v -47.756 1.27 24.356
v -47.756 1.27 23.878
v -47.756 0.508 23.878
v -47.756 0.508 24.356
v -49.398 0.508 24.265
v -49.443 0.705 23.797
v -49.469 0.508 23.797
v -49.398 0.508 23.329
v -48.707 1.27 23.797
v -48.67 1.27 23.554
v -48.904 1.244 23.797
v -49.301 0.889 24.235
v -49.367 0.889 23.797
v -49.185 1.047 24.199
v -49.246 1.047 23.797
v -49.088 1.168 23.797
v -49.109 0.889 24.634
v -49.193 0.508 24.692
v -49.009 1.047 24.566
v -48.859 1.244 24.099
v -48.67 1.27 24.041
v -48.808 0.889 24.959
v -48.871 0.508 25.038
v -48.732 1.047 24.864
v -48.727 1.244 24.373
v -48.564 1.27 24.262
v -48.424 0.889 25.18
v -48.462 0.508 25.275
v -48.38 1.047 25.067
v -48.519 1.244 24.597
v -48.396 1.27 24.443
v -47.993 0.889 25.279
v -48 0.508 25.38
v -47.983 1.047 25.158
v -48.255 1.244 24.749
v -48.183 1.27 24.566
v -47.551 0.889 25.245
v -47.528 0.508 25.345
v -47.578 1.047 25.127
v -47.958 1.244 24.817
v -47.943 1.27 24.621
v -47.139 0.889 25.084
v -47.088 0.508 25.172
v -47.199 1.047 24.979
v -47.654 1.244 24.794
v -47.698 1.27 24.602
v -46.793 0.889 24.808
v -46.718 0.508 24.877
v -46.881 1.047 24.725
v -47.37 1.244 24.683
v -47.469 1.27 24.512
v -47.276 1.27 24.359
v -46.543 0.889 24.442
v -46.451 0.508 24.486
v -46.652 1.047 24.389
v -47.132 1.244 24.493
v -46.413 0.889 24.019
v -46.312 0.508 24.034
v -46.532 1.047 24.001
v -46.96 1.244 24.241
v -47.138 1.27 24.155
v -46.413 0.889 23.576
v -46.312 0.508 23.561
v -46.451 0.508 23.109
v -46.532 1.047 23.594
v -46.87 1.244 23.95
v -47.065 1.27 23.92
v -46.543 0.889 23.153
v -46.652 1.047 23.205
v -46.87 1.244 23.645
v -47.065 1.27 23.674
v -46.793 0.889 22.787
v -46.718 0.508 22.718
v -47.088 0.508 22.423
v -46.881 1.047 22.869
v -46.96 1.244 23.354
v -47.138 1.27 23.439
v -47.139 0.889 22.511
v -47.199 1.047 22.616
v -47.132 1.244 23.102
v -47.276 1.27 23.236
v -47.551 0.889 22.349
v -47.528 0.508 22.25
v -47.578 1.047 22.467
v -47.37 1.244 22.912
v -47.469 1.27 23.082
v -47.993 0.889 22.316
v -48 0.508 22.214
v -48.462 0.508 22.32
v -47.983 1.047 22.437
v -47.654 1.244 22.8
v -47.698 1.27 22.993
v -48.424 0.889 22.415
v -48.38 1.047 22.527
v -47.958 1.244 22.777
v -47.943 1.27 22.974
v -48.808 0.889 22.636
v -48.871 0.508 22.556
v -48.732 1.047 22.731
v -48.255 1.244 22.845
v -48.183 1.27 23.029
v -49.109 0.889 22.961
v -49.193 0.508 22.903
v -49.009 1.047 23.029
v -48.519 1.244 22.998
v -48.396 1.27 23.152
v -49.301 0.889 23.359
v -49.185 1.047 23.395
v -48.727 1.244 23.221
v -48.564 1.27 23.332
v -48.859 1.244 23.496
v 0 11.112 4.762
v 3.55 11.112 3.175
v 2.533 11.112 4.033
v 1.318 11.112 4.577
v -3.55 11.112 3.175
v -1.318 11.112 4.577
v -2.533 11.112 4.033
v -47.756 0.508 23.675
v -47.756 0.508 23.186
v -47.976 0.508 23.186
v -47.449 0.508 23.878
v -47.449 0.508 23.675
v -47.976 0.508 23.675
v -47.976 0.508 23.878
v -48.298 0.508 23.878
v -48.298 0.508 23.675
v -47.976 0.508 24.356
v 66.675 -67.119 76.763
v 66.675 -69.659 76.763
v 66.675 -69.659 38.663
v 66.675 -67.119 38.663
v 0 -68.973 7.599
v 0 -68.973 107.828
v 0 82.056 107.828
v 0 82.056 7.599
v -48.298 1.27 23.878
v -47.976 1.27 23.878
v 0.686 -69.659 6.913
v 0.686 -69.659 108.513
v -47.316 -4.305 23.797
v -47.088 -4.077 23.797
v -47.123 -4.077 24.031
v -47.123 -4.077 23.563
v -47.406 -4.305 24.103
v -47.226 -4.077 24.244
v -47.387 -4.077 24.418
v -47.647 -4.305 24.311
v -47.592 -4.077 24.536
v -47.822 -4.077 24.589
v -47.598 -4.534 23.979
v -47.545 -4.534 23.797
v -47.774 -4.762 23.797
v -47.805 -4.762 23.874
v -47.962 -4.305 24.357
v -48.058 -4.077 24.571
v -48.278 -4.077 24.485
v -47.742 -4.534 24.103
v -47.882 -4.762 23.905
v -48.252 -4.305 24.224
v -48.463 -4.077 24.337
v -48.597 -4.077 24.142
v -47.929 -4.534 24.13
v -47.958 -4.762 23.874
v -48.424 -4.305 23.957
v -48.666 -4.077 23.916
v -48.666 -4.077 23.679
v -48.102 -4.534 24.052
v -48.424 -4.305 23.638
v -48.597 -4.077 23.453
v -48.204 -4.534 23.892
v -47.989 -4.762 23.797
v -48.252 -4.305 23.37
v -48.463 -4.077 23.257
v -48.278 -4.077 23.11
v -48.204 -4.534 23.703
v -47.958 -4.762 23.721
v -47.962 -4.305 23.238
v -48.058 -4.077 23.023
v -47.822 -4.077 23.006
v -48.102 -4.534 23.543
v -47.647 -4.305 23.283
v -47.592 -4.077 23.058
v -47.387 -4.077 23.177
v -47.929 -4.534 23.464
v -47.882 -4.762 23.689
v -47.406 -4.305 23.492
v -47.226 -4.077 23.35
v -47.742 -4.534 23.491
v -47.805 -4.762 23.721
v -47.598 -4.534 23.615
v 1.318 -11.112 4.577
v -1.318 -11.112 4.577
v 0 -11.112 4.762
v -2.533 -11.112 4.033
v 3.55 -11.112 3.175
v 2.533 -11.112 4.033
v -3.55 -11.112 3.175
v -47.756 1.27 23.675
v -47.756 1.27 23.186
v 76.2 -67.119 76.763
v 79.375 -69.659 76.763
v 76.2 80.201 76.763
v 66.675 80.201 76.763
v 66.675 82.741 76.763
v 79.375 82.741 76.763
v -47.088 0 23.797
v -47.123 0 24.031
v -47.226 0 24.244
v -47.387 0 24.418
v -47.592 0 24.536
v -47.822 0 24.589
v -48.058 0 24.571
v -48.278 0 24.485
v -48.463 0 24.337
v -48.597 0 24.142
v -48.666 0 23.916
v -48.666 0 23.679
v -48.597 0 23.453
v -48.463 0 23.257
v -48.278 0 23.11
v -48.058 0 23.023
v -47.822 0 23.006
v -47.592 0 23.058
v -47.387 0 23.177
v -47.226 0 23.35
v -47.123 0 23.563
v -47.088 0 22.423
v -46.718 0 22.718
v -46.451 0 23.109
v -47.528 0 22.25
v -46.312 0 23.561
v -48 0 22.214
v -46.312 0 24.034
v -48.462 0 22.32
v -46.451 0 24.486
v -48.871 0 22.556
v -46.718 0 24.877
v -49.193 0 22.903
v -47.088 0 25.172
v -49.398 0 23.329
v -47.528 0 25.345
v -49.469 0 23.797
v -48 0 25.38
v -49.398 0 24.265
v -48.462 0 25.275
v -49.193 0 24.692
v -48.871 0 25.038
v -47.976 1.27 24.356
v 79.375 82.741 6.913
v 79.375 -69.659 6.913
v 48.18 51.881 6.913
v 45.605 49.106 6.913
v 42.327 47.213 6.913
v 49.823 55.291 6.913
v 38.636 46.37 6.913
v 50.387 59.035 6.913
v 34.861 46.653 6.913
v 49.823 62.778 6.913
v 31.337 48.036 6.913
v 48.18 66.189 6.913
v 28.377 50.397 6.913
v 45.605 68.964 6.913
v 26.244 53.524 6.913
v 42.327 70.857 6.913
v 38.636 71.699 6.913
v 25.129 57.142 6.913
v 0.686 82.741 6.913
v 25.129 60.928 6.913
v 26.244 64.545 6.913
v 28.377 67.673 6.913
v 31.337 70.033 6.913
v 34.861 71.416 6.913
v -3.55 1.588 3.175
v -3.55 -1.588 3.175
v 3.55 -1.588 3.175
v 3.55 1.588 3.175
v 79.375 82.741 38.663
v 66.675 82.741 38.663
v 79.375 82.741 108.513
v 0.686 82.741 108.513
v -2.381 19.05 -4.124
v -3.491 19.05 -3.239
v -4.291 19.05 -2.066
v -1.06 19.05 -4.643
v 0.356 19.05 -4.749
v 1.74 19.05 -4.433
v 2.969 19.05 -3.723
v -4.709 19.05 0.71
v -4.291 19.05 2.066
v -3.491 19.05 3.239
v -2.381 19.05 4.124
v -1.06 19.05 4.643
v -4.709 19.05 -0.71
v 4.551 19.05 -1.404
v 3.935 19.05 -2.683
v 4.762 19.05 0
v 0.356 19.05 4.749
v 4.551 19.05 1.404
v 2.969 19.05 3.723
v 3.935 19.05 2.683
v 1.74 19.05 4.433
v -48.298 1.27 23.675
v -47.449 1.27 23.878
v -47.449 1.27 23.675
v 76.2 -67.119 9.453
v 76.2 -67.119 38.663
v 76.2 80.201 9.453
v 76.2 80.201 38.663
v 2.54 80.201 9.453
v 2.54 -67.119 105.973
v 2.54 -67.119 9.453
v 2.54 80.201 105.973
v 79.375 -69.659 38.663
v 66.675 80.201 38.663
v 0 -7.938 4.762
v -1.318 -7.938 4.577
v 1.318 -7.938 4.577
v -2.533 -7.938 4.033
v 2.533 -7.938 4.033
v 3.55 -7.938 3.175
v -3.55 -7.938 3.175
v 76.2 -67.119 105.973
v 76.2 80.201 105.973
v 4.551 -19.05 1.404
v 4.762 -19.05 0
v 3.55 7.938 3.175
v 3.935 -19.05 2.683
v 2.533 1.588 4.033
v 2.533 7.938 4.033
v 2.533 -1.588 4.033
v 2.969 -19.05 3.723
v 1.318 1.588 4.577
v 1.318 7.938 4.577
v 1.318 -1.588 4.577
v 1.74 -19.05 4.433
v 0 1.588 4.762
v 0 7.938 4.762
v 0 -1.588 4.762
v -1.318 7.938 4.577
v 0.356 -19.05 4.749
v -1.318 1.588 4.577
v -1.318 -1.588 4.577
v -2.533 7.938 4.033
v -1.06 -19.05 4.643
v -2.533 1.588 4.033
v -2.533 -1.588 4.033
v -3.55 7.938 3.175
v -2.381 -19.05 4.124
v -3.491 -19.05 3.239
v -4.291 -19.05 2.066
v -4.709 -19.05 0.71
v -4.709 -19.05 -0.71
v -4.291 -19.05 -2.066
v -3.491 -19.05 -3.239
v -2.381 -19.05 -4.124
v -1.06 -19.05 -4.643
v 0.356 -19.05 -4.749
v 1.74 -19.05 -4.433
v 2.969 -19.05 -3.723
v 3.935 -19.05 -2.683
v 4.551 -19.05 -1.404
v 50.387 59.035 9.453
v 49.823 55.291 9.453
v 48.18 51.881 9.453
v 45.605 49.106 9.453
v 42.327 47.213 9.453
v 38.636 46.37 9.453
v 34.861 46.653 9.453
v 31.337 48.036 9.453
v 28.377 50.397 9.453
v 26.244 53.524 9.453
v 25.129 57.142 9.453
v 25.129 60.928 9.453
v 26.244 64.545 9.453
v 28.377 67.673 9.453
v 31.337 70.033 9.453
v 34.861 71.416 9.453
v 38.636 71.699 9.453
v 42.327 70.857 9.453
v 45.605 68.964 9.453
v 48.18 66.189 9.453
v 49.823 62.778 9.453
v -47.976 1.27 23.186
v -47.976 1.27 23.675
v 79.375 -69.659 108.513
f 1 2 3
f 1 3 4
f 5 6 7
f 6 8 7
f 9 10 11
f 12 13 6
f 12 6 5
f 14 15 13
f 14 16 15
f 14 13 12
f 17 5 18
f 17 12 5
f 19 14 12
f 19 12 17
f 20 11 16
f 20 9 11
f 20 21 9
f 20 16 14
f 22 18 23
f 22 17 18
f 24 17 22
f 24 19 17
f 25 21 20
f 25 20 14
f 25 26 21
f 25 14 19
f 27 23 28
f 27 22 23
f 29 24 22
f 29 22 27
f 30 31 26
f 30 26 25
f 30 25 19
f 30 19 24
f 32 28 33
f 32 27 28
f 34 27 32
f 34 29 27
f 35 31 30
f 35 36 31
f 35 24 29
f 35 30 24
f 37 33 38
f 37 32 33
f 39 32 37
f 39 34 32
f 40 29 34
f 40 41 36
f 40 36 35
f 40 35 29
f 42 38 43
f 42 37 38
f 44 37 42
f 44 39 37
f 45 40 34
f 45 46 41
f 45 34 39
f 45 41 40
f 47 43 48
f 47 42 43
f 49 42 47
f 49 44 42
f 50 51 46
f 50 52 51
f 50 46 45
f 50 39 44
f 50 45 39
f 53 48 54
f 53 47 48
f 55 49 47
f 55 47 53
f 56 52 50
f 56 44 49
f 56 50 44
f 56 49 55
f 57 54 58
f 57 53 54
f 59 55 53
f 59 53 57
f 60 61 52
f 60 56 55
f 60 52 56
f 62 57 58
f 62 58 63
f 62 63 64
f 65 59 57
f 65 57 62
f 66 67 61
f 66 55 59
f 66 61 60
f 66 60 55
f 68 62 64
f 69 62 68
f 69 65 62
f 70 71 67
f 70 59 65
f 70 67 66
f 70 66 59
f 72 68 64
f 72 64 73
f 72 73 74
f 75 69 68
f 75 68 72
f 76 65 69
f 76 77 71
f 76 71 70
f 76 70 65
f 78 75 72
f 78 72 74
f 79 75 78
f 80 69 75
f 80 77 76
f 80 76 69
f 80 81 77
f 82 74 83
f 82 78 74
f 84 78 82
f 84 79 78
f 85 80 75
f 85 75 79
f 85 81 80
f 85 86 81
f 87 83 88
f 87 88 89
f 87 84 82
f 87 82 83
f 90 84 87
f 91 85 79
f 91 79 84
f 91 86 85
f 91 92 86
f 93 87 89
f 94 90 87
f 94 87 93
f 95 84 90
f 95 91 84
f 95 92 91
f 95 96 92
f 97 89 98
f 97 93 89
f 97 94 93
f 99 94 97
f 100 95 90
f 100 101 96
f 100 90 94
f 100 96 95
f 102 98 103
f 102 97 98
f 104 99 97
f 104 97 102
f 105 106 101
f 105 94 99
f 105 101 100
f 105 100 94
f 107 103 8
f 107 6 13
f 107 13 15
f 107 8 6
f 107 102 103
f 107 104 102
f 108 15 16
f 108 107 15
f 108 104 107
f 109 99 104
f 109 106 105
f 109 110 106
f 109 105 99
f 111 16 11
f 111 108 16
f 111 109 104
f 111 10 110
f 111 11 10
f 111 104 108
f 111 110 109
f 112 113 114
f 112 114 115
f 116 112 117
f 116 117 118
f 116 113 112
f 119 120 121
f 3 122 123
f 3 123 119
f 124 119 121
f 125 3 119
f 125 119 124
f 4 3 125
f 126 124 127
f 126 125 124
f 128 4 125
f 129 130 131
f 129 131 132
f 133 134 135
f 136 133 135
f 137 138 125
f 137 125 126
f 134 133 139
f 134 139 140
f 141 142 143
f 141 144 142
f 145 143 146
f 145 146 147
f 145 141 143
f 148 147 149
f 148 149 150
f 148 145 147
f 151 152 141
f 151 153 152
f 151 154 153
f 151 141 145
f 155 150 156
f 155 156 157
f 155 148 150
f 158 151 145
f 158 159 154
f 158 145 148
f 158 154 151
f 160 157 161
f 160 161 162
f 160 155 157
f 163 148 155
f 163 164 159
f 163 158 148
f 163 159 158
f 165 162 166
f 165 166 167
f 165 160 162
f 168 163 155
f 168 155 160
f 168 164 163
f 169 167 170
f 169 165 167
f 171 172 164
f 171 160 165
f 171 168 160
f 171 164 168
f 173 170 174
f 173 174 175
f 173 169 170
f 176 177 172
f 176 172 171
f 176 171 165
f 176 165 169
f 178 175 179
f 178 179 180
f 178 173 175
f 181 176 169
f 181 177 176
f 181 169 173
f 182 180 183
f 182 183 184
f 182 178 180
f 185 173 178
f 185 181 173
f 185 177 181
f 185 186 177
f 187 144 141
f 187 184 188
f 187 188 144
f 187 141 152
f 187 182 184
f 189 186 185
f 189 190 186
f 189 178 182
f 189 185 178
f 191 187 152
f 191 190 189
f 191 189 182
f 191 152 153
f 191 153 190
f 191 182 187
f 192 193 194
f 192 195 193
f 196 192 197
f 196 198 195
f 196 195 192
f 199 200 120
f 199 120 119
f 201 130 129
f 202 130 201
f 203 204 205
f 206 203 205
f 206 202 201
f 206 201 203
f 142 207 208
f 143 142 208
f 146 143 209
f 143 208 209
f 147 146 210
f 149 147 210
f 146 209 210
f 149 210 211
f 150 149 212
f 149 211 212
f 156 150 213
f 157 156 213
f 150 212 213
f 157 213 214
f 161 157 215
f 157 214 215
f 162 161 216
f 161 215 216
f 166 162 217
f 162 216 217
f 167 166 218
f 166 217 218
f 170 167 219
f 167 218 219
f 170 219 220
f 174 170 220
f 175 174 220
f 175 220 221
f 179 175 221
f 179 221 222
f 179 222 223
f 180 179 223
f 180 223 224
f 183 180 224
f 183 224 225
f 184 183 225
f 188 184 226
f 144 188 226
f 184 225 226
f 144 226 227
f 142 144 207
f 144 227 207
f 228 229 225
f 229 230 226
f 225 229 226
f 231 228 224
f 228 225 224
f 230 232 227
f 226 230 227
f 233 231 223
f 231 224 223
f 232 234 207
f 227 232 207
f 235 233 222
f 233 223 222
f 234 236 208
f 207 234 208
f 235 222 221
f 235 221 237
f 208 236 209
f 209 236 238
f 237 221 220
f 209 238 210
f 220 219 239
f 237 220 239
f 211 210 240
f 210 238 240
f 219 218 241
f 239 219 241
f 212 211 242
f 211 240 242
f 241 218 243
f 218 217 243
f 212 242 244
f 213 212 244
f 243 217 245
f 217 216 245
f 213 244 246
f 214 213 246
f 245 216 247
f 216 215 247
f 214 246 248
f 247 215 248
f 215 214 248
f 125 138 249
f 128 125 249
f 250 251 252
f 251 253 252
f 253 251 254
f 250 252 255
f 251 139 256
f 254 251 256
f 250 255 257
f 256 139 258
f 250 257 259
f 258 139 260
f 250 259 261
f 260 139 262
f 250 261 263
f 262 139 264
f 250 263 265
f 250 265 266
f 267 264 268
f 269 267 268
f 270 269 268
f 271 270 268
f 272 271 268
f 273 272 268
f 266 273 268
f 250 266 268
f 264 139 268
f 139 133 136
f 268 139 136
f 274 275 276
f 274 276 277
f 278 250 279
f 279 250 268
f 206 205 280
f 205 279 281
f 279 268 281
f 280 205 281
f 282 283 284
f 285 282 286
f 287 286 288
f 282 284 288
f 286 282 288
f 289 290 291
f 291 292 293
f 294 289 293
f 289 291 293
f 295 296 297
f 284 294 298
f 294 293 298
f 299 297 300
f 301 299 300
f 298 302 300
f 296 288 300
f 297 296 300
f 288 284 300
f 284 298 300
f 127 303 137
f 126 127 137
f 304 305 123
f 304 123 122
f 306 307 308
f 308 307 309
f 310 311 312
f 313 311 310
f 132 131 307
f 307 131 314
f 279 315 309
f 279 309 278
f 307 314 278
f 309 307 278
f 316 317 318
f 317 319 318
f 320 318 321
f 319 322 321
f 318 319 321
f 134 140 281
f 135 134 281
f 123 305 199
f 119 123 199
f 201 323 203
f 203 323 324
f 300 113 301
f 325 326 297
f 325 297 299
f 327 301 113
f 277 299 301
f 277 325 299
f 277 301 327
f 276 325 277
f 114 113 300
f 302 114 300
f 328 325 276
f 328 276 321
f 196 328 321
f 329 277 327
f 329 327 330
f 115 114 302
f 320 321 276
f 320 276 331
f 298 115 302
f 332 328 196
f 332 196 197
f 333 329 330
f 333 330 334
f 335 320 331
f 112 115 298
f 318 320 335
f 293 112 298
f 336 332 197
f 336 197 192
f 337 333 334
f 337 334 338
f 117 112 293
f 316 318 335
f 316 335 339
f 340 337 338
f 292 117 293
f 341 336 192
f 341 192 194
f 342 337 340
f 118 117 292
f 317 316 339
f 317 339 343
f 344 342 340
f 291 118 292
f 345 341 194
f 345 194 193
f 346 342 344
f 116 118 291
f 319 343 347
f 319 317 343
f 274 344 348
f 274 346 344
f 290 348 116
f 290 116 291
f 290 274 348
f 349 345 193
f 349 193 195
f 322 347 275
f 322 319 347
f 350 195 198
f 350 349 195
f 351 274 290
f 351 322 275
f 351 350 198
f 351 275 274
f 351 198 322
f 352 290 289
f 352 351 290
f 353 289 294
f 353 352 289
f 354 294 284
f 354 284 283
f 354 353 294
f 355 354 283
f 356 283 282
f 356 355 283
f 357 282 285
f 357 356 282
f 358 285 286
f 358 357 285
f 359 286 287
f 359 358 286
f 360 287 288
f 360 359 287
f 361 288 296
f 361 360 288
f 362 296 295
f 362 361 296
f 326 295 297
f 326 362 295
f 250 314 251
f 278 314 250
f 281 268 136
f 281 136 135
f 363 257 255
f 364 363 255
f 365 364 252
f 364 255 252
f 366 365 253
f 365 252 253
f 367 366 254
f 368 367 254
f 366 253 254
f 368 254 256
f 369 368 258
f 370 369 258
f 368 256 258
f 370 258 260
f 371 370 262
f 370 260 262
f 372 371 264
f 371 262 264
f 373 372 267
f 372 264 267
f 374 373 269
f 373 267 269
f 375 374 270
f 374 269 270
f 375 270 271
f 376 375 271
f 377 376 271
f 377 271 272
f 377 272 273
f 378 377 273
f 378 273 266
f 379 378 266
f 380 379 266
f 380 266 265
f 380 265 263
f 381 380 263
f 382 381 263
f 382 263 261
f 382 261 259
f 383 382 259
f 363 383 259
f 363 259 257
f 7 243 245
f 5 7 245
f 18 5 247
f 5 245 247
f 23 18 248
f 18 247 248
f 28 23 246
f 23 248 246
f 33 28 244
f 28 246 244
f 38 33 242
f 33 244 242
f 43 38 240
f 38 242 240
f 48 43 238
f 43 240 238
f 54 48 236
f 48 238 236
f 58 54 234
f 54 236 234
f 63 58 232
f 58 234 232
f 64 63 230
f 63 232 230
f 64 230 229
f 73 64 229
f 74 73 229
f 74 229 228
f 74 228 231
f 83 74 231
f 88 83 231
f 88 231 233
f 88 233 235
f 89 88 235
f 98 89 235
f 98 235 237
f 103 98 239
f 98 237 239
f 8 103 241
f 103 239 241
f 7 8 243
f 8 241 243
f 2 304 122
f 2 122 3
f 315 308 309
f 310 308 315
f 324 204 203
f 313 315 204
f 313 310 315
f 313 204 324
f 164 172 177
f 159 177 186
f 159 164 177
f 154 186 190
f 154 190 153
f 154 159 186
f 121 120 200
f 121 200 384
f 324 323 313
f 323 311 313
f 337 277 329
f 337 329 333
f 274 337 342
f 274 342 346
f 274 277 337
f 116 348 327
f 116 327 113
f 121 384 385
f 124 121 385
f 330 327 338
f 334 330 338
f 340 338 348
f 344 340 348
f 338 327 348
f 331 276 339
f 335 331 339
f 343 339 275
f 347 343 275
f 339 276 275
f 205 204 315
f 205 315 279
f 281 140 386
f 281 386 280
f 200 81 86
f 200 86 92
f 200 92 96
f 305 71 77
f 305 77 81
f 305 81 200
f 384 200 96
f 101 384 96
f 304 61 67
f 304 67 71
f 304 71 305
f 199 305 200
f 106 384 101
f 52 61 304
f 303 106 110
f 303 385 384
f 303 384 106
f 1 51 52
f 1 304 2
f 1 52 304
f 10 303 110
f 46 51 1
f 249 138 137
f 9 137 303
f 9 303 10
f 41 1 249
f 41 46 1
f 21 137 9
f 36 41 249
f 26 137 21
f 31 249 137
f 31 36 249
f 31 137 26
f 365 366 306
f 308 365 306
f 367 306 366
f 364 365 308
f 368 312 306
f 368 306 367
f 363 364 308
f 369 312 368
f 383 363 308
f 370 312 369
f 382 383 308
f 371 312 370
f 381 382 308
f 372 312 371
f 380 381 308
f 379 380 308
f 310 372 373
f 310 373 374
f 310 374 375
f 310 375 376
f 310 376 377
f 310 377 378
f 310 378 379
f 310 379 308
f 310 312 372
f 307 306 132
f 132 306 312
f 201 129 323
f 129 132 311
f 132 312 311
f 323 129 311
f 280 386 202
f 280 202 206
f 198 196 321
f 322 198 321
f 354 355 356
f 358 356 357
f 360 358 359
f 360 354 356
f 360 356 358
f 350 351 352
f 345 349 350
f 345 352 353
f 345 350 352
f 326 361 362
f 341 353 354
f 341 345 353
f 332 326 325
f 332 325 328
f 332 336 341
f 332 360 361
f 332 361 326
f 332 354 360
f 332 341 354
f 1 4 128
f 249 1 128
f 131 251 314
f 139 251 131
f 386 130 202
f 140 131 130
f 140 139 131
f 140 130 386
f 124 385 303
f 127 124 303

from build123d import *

# Parameters (mm, degrees)
F0_R       = 4.7625
F1_DEPTH   = 19.05
F2_W       = 3.175
F2_H       = 3.3072910916
F3_DEPTH   = 12.7
F4_W       = 152.4
F4_H       = 101.6
F5_DEPTH   = 76.2
F6_T       = -2.54
F7_W       = 152.4
F7_H       = 101.6
F8_DEPTH   = 3.175
F9_W       = 177.8
F9_H       = 38.1
F10_DEPTH  = 12.7
F11_R      = 12.7
F12_DEPTH  = 25.4
F13_R      = 0.79375
F14_DEPTH  = 4.7625
F15_SIZE   = 0.6858
F15_2_SIZE = 0.6858
F16_R      = 1.5875
F17_DEPTH  = 1.27
F18_R      = 0.762
F19_W      = 0.2193674445
F19_H      = 1.16994977
F20_DEPTH  = 0.762
F21_W      = 0.8484892041
F21_H      = 0.2032797784
F22_DEPTH  = 0.762


with BuildPart() as f1:
    # F0 (on Front) → F1 (new body, symmetric)
    with BuildSketch(Plane.XZ):
        Circle(F0_R)
    extrude(amount=F1_DEPTH, both=True)

    # F2 (on Right) → F3 (cut, symmetric)
    with BuildSketch(Plane.YZ):
        with Locations((0, 4.8286455458)):
            Rectangle(F2_W, F2_H)
        with Locations((9.525, 4.8286455458)):
            Rectangle(F2_W, F2_H)
        with Locations((-9.525, 4.8286455458)):
            Rectangle(F2_W, F2_H)
    extrude(amount=F3_DEPTH, both=True, mode=Mode.SUBTRACT)


with BuildPart() as f5:
    # F4 (on Right) → F5 (new body)
    with BuildSketch(Plane.YZ):
        with Locations((6.5414318815, 57.7133724002)):
            Rectangle(F4_W, F4_H)
    extrude(amount=F5_DEPTH)

    # F6
    f6_openings = [f5.faces().sort_by_distance(p)[0] for p in [
        (76.2, 6.541432, 57.713372),
    ]]
    offset(amount=F6_T, openings=f6_openings)

    # F7 (on face) → F8 (join)
    with BuildSketch(Plane.YZ.offset(76.2)):
        with Locations((6.5414318815, 57.7133724002)):
            Rectangle(F7_W, F7_H)
    extrude(amount=F8_DEPTH)

    # F9 (on face) → F10 (cut)
    with BuildSketch(Plane.YZ.offset(79.375)):
        with Locations((6.8365962322, 57.7133724002)):
            Rectangle(F9_W, F9_H)
    extrude(amount=-F10_DEPTH, mode=Mode.SUBTRACT)

    # F11 (on face) → F12 (cut)
    with BuildSketch(Plane(origin=(0, 0, 6.9133724002), x_dir=(1, 0, 0), z_dir=(0, 0, -1))):
        with Locations((37.6867502928, -59.0348131955)):
            Circle(F11_R)
    extrude(amount=-F12_DEPTH, mode=Mode.SUBTRACT)

    # F15#2
    f15_2_edges = [f5.edges().sort_by_distance(p)[0] for p in [
        (0, 82.741432, 57.713372),
        (0, 6.541432, 108.513372),
        (0, -69.658568, 57.713372),
        (0, 6.541432, 6.913372),
    ]]
    chamfer(f15_2_edges, length=F15_2_SIZE)


with BuildPart() as f14:
    # F13 (on Front) → F14 (new body)
    with BuildSketch(Plane.XZ):
        with Locations((-47.8815212846, 23.7973220646)):
            Circle(F13_R)
    extrude(amount=F14_DEPTH)

    # F15
    f15_edges = [f14.edges().sort_by_distance(p)[0] for p in [
        (-48.675271, -4.7625, 23.797322),
    ]]
    chamfer(f15_edges, length=F15_SIZE)

    # F16 (on face) → F17 (join)
    with BuildSketch(Plane(origin=(0, 0, 0), x_dir=(-1, 0, 0), z_dir=(0, 1, 0))):
        with Locations((47.8815212846, 23.7973220646)):
            Circle(F16_R)
    extrude(amount=F17_DEPTH)

    # F18
    f18_edges = [f14.edges().sort_by_distance(p)[0] for p in [
        (-46.294021, 1.27, 23.797322),
    ]]
    fillet(f18_edges, radius=F18_R)

    # F19 (on face) → F20 (cut)
    with BuildSketch(Plane(origin=(0, 1.27, 0), x_dir=(-1, 0, 0), z_dir=(0, 1, 0))):
        with Locations((47.8660054505, 23.7711463124)):
            Rectangle(F19_W, F19_H)
    extrude(amount=-F20_DEPTH, mode=Mode.SUBTRACT)

    # F21 (on face) → F22 (cut)
    with BuildSketch(Plane(origin=(0, 1.27, 0), x_dir=(-1, 0, 0), z_dir=(0, 1, 0))):
        with Locations((47.8733357295, 23.7765004858)):
            Rectangle(F21_W, F21_H)
    extrude(amount=-F22_DEPTH, mode=Mode.SUBTRACT)


solid = Compound([f1.part, f5.part, f14.part])
